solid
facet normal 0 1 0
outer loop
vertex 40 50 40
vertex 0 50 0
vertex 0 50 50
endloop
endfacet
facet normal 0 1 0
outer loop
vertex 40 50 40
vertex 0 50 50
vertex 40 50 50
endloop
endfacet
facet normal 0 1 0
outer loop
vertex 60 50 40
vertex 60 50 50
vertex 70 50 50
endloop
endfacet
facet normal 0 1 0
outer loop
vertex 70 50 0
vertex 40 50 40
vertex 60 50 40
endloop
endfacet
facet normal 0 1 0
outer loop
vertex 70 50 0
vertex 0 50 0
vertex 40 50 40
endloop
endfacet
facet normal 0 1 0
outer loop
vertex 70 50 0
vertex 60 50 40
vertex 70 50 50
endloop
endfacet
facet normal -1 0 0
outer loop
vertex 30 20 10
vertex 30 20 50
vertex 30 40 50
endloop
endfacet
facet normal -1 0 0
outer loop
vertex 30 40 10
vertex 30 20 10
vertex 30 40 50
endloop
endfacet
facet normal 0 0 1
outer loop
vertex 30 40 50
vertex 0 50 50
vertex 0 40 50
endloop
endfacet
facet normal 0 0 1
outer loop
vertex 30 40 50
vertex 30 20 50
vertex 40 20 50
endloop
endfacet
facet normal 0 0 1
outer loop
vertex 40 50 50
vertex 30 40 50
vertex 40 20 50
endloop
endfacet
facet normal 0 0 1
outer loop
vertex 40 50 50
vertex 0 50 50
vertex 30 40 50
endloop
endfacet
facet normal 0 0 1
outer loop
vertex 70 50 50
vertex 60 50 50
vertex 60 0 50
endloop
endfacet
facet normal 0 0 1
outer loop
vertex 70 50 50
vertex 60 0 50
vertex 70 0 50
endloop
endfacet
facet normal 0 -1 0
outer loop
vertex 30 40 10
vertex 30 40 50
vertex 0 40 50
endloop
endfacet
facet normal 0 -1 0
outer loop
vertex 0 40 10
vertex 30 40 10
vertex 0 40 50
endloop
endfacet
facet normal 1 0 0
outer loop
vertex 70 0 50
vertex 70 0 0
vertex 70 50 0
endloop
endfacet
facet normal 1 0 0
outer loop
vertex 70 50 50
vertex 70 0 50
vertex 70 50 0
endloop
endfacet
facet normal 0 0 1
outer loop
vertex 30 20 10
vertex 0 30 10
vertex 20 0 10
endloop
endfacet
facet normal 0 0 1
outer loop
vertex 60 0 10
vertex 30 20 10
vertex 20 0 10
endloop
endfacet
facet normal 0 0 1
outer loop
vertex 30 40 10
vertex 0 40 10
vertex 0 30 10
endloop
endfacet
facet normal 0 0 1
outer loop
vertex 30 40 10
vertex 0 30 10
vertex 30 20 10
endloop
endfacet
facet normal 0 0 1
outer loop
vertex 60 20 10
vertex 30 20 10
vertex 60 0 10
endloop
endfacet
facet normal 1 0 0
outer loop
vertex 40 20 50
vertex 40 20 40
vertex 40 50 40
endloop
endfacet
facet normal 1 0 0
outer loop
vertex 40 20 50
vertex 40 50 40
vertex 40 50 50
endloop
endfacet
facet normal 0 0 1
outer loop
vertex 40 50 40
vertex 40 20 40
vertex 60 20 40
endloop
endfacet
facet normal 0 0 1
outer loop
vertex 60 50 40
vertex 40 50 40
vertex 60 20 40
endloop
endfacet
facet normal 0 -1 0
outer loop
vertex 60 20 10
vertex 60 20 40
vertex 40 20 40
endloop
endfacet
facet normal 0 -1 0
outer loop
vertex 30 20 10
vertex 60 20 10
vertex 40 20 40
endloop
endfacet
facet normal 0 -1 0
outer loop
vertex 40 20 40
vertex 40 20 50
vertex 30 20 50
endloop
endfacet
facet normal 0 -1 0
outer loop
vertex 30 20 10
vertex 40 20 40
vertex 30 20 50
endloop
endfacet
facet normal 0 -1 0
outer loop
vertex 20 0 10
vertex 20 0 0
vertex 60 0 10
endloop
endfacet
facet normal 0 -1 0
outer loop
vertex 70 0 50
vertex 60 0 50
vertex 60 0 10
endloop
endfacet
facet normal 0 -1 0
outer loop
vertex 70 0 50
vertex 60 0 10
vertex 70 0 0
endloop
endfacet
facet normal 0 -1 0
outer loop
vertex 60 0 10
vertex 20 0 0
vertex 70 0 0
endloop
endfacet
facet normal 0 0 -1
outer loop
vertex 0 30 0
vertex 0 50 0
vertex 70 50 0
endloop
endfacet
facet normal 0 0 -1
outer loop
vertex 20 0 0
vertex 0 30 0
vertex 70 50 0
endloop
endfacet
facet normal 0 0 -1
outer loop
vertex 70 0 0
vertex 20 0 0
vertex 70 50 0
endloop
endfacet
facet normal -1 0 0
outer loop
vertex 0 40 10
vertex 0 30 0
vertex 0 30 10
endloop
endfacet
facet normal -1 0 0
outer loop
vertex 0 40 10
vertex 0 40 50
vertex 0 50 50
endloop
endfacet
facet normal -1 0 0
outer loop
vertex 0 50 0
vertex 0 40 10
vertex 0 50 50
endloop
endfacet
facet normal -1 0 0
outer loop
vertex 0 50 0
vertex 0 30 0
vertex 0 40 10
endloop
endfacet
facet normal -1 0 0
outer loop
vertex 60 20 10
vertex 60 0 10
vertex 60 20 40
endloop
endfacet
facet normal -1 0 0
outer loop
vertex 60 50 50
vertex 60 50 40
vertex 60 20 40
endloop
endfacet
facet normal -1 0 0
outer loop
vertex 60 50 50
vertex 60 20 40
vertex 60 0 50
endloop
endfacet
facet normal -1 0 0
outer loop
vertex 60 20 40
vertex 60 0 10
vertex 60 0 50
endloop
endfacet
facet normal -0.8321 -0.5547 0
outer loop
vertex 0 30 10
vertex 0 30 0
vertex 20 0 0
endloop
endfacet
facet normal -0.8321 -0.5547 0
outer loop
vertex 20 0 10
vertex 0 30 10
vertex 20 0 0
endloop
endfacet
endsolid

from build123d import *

# Parameters (mm, degrees)
SKETCH1_W           = 70
SKETCH1_H           = 50
BOSS_EXTRUDE1_DEPTH = 50
CUT_EXTRUDE2_DEPTH  = 50
CUT_EXTRUDE4_DEPTH  = 40
SKETCH5_W           = 20
SKETCH5_H           = 10
CUT_EXTRUDE5_DEPTH  = 40


with BuildPart() as part:
    # Sketch1 → Boss-Extrude1 (new body)
    with BuildSketch(Plane.XY):
        with Locations((35, 25)):
            Rectangle(SKETCH1_W, SKETCH1_H)
    extrude(amount=BOSS_EXTRUDE1_DEPTH)

    # Sketch3 → Cut-Extrude2 (cut)
    with BuildSketch(Plane.XY):
        Polygon((0, 30), (20, 0), (0, 0), align=None)
    extrude(amount=CUT_EXTRUDE2_DEPTH, mode=Mode.SUBTRACT)

    # Sketch4 → Cut-Extrude4 (cut)
    with BuildSketch(Plane.XY.offset(50)):
        Polygon((60, 0), (60, 20), (30, 20), (30, 40), (0, 40), (0, 30), (20, 0), align=None)
    extrude(amount=-CUT_EXTRUDE4_DEPTH, mode=Mode.SUBTRACT)

    # Sketch5 → Cut-Extrude5 (cut)
    with BuildSketch(Plane.XZ.offset(-20)):
        with Locations((50, 45)):
            Rectangle(SKETCH5_W, SKETCH5_H)
    extrude(amount=-CUT_EXTRUDE5_DEPTH, mode=Mode.SUBTRACT)


solid = part.part
